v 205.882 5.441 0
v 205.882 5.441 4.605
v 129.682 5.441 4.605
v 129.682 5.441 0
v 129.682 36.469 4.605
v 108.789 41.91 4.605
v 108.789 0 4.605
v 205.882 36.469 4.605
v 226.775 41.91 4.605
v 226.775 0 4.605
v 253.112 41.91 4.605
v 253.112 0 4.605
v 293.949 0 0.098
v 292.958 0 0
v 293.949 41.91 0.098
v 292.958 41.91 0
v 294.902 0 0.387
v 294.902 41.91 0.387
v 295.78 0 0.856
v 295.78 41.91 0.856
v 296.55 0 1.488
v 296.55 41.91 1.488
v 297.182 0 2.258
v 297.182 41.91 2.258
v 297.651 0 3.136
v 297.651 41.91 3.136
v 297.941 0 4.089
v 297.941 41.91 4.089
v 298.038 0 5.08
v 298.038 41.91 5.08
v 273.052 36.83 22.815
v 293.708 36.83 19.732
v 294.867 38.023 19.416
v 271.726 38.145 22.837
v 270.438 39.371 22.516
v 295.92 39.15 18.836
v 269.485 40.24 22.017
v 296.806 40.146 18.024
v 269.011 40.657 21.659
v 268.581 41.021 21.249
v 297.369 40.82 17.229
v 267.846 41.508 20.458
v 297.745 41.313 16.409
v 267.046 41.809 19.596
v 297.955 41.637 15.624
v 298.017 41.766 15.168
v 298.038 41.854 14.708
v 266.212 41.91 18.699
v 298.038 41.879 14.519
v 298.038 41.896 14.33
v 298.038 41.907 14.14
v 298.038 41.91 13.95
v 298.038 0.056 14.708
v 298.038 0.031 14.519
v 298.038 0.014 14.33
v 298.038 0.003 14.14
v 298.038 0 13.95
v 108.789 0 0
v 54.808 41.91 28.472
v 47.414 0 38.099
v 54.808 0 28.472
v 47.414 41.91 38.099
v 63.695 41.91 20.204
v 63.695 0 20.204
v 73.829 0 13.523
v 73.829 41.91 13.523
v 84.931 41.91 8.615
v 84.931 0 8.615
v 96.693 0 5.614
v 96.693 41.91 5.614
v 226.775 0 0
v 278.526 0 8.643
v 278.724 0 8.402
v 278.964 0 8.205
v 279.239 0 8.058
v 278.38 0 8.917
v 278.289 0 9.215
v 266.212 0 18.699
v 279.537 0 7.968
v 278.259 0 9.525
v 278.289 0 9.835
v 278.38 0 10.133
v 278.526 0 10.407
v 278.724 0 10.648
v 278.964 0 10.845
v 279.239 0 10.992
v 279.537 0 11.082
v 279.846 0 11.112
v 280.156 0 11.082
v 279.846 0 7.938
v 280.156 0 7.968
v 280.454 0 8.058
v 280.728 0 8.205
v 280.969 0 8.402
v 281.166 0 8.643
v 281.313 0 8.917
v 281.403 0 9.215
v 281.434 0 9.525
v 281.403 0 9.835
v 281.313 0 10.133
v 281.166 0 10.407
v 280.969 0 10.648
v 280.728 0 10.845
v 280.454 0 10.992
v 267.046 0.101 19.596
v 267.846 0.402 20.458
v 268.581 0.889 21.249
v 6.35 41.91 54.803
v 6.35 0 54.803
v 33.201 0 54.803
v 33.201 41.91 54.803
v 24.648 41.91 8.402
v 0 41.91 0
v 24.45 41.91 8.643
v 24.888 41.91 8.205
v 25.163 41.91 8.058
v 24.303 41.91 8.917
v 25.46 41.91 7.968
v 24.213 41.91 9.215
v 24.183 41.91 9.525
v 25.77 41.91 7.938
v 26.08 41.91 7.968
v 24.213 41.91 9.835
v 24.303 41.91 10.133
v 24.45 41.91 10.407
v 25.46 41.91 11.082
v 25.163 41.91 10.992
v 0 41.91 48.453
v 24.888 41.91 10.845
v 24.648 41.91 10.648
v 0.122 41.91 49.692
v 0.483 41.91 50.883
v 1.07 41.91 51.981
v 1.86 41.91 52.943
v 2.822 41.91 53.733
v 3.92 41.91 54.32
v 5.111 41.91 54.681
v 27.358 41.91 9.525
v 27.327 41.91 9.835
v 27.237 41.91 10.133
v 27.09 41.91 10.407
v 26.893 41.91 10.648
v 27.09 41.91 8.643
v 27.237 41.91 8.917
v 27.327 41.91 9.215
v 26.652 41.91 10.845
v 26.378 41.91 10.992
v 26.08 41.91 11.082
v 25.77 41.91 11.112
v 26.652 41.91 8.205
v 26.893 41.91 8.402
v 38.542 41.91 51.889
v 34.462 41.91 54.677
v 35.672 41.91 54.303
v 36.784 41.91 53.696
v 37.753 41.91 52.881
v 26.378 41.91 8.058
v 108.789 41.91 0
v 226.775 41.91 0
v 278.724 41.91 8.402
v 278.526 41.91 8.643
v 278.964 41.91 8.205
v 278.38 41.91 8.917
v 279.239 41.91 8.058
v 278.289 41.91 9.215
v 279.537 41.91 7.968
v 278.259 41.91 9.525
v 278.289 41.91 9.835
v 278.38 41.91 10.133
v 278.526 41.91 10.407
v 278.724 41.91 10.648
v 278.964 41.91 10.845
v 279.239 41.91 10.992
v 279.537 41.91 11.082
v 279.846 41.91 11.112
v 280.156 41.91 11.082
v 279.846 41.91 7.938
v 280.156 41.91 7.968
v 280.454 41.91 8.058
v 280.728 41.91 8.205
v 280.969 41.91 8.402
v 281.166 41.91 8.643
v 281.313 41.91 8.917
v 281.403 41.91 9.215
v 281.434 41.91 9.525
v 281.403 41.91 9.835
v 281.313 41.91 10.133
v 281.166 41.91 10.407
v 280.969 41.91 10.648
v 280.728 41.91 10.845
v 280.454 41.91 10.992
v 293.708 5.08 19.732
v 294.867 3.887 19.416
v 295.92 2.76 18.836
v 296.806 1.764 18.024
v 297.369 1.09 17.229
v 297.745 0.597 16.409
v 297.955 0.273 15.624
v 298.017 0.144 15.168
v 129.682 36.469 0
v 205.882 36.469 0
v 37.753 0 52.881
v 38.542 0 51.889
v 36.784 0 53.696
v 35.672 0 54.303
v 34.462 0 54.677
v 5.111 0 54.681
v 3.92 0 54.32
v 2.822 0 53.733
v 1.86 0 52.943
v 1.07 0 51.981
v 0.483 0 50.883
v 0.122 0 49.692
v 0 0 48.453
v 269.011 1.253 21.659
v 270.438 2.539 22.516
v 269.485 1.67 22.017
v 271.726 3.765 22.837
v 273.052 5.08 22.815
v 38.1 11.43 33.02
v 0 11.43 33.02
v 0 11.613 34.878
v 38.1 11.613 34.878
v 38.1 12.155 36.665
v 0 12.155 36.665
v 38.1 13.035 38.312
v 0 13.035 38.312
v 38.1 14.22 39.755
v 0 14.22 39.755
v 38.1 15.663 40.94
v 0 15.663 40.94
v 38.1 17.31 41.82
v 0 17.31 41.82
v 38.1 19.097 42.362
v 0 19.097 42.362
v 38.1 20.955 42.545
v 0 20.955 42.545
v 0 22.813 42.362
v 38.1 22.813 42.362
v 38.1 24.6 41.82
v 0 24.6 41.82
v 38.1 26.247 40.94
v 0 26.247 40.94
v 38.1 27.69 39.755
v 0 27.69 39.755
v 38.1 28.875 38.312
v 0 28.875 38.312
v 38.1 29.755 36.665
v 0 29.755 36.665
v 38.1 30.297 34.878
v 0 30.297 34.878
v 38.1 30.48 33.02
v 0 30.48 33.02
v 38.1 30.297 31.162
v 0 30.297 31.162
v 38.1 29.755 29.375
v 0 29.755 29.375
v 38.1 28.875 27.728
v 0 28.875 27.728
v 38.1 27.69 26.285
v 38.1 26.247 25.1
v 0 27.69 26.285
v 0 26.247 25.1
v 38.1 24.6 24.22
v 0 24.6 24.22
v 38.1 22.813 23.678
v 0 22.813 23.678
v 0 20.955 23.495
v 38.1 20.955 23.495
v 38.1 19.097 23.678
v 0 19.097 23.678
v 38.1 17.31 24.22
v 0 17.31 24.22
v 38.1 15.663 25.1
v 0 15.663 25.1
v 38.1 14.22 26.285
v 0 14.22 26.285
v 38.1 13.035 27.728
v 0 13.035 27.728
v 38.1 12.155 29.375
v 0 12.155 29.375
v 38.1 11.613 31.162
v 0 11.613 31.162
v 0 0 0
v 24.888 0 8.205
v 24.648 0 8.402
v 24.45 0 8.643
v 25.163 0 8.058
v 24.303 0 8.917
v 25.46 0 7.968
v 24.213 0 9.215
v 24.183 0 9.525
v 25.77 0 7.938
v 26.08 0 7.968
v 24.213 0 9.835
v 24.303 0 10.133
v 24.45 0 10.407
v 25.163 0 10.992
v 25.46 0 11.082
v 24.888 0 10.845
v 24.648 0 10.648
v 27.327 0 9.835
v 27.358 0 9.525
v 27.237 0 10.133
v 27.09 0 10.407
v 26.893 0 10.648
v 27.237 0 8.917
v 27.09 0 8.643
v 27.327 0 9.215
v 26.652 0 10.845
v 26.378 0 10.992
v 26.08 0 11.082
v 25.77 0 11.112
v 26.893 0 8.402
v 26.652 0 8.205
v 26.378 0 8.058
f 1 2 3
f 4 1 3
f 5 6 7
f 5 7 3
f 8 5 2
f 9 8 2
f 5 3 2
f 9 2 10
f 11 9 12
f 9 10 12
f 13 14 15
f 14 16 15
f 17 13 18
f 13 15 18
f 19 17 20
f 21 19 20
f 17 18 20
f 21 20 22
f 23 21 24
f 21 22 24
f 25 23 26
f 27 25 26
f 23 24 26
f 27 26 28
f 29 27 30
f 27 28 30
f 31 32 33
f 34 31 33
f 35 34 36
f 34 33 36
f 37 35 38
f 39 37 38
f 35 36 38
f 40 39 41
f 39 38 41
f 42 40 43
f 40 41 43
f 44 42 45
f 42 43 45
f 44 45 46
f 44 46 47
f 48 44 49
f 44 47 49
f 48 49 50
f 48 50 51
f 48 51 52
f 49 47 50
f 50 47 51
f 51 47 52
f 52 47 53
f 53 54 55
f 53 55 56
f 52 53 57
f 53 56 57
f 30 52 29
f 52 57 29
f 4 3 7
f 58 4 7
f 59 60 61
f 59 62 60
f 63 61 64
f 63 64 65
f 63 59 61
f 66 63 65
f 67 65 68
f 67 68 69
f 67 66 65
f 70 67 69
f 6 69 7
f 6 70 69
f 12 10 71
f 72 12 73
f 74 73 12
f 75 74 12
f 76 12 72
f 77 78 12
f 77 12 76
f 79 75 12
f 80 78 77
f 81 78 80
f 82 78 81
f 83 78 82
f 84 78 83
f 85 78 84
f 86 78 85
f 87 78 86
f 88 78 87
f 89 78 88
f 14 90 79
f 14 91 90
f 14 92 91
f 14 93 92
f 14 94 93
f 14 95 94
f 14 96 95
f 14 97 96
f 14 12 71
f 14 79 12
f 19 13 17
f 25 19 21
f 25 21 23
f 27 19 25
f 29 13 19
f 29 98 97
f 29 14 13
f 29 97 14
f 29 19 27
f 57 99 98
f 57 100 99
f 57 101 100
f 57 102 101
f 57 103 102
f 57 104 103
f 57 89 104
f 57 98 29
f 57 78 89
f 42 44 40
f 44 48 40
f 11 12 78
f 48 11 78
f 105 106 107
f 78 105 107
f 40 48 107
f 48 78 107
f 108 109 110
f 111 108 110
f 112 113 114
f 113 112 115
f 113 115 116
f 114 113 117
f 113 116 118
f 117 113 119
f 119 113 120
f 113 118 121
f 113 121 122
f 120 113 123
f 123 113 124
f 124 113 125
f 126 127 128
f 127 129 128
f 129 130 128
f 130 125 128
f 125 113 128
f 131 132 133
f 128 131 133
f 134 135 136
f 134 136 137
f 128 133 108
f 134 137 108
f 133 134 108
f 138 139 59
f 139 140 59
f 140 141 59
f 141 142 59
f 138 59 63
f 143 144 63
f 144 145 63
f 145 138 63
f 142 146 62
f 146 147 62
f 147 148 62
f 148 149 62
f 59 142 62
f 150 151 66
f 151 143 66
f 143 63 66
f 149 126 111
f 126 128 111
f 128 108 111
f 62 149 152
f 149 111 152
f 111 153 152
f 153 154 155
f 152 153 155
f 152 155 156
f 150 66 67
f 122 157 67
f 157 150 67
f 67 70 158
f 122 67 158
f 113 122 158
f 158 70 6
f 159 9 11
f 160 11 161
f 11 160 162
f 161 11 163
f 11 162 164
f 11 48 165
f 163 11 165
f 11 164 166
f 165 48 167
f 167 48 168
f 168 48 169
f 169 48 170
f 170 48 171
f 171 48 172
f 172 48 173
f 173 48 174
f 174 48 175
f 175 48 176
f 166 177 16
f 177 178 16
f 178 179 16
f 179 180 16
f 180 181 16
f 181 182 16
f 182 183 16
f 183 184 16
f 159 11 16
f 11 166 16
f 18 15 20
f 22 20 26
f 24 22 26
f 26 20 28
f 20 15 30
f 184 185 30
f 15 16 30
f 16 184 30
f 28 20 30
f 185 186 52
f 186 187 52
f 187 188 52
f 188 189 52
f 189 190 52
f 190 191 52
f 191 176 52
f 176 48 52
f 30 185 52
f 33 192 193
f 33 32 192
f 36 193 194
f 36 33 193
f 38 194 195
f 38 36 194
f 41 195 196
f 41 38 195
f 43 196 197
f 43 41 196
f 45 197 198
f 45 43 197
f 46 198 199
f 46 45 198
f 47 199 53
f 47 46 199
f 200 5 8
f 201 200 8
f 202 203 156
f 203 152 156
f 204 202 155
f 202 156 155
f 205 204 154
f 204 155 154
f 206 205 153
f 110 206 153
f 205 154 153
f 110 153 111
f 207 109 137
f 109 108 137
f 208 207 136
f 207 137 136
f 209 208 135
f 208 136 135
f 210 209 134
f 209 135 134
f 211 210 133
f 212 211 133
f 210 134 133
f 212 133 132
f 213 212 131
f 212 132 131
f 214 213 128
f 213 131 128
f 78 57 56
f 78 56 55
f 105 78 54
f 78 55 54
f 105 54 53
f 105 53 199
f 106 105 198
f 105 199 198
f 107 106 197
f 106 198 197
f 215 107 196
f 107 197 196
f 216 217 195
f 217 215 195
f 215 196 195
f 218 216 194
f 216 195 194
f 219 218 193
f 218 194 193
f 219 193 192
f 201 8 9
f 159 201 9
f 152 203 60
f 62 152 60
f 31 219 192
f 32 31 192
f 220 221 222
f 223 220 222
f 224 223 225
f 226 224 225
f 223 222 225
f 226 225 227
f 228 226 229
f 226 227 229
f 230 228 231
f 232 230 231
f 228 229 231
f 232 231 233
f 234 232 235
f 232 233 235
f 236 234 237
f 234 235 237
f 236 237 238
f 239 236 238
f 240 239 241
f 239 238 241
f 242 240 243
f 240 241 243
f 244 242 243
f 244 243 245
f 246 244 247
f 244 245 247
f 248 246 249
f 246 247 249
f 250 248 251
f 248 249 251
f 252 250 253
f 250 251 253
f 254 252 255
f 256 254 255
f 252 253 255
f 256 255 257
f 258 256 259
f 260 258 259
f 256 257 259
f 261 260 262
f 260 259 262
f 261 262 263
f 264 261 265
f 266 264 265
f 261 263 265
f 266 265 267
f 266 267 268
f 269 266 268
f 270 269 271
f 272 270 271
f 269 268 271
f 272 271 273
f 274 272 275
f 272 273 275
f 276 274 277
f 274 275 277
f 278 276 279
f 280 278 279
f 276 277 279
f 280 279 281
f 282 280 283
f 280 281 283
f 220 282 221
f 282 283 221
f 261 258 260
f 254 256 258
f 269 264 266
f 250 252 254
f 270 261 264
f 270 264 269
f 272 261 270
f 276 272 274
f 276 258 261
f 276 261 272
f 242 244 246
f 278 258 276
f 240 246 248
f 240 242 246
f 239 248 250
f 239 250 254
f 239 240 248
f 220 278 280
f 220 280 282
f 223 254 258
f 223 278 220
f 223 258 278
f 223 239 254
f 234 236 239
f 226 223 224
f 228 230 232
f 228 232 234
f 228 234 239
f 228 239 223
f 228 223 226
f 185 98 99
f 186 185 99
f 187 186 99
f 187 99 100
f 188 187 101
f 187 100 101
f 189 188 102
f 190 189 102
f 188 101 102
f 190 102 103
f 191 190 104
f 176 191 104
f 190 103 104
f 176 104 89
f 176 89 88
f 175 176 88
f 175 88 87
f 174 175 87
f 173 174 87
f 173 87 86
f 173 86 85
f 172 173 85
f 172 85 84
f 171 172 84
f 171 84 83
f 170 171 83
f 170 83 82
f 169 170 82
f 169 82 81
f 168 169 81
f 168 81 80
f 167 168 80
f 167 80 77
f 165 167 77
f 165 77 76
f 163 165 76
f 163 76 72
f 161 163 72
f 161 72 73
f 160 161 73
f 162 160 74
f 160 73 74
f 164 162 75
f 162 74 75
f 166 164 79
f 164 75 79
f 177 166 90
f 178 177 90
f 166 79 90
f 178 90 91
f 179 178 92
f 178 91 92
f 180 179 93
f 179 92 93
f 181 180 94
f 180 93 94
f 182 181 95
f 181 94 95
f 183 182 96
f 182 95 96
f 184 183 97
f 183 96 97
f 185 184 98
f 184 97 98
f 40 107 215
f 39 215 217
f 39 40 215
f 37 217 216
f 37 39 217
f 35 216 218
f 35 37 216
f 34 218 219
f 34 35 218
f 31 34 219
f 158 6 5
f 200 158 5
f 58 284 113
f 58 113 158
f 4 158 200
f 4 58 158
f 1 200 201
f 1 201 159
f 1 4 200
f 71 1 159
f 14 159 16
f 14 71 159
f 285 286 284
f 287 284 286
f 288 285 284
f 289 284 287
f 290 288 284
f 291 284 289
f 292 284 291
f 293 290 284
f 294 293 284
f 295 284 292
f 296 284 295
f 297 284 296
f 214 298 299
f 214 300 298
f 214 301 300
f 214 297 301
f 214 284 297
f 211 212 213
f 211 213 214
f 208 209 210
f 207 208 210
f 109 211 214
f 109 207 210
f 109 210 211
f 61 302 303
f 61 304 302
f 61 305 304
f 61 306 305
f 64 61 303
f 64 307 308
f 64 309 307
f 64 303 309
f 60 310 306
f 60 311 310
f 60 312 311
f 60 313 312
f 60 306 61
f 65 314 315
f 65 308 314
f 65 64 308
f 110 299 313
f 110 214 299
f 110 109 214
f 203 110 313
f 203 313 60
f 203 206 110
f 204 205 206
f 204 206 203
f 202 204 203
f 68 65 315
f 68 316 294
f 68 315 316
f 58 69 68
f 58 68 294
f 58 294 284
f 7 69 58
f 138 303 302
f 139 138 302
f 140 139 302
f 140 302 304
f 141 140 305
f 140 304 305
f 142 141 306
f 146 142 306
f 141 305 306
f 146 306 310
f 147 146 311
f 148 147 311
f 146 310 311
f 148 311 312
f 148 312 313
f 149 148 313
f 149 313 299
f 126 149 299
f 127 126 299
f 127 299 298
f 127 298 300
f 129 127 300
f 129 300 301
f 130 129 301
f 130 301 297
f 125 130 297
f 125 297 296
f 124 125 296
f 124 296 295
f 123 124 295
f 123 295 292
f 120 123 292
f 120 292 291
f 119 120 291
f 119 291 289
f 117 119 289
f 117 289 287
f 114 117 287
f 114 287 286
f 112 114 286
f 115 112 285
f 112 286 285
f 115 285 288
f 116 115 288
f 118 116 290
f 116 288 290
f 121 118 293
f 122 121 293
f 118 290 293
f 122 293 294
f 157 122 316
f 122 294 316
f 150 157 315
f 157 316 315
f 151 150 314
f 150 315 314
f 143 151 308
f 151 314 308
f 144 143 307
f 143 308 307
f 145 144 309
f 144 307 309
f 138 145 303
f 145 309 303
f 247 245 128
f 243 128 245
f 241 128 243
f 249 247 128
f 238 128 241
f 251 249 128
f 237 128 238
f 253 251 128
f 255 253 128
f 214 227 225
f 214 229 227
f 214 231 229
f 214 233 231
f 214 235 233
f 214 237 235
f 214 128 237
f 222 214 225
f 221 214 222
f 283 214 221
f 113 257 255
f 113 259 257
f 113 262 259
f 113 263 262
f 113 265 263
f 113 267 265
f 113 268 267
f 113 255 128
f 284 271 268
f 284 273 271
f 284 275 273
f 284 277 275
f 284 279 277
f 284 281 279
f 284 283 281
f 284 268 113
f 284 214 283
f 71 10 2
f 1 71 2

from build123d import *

# Parameters (mm, degrees)
F1_DEPTH  = 41.91
F2_R      = 9.525
F3_DEPTH  = 38.1
F6_DEPTH  = 41.91
F7_R      = 72.9800133434
F8_R      = 6.35
F4_R      = 1.5875
F9_DEPTH  = 128.27
F10_DEPTH = 90.678
F11_R     = 5.08
F13_DEPTH = 39.624


with BuildPart() as f1:
    # F0 (on Front) → F1 (new body)
    with BuildSketch(Plane.XZ):
        Polygon((0, 62.717492425), (0, 0), (301.1213292729, 0), (301.1213292729, 19.05), align=None)
    extrude(amount=-F1_DEPTH)

    # F2 (on face) → F3 (cut)
    with BuildSketch(Plane(origin=(0, 0, 0), x_dir=(0, -1, 0), z_dir=(-1, 0, 0))):
        with Locations((-20.955, 33.02)):
            Circle(F2_R)
    extrude(amount=-F3_DEPTH, mode=Mode.SUBTRACT)

    # F5 (on face) → F6 (cut)
    with BuildSketch(Plane.XZ):
        Polygon((36.6667471826, 54.8031888902), (68.9622256454, 4.6046015509), (253.1122256454, 4.6046015509), (270.404113194, 23.2097251733), (298.0381529682, 19.0862017092), (298.0381529682, 0), (301.1213292729, 0), (301.1213292729, 19.05), (0, 62.717492425), (0, 54.8031888902), align=None)
    extrude(amount=-F6_DEPTH, mode=Mode.SUBTRACT)

    # F7
    f7_edges = [f1.edges().sort_by_distance(p)[0] for p in [
        (68.962226, 20.955, 4.604602),
    ]]
    fillet(f7_edges, radius=F7_R)

    # F8
    f8_edges = [f1.edges().sort_by_distance(p)[0] for p in [
        (36.666747, 20.955, 54.803189),
        (0, 20.955, 54.803189),
    ]]
    fillet(f8_edges, radius=F8_R)

    # F4 (on face) → F9 (cut)
    with BuildSketch(Plane.XZ):
        with Locations((279.8462808132, 9.525)):
            Circle(F4_R)
    extrude(amount=-F9_DEPTH, mode=Mode.SUBTRACT)

    # F4 (on face) → F10 (cut)
    with BuildSketch(Plane.XZ):
        with Locations((279.8462808132, 9.525)):
            Circle(F4_R)
        with Locations((25.7700905204, 9.525)):
            Circle(F4_R)
    extrude(amount=-F10_DEPTH, mode=Mode.SUBTRACT)

    # F11
    f11_edges = [f1.edges().sort_by_distance(p)[0] for p in [
        (298.038153, 20.955, 19.086202),
        (270.404113, 20.955, 23.209725),
        (284.221133, 41.91, 21.147963),
        (284.221133, 0, 21.147963),
        (298.038153, 20.955, 0),
    ]]
    fillet(f11_edges, radius=F11_R)

    # F12 (on face) → F13 (cut)
    with BuildSketch(Plane.XY.offset(4.6046015509)):
        Polygon((108.789094354, 0), (226.7754729672, 0), (205.8822836606, 5.4408400638), (129.6822836606, 5.4408400638), align=None)
        Polygon((205.8822836606, 36.4691599362), (226.7754729672, 41.91), (108.789094354, 41.91), (129.6822836606, 36.4691599362), align=None)
    extrude(amount=-F13_DEPTH, mode=Mode.SUBTRACT)


solid = f1.part
